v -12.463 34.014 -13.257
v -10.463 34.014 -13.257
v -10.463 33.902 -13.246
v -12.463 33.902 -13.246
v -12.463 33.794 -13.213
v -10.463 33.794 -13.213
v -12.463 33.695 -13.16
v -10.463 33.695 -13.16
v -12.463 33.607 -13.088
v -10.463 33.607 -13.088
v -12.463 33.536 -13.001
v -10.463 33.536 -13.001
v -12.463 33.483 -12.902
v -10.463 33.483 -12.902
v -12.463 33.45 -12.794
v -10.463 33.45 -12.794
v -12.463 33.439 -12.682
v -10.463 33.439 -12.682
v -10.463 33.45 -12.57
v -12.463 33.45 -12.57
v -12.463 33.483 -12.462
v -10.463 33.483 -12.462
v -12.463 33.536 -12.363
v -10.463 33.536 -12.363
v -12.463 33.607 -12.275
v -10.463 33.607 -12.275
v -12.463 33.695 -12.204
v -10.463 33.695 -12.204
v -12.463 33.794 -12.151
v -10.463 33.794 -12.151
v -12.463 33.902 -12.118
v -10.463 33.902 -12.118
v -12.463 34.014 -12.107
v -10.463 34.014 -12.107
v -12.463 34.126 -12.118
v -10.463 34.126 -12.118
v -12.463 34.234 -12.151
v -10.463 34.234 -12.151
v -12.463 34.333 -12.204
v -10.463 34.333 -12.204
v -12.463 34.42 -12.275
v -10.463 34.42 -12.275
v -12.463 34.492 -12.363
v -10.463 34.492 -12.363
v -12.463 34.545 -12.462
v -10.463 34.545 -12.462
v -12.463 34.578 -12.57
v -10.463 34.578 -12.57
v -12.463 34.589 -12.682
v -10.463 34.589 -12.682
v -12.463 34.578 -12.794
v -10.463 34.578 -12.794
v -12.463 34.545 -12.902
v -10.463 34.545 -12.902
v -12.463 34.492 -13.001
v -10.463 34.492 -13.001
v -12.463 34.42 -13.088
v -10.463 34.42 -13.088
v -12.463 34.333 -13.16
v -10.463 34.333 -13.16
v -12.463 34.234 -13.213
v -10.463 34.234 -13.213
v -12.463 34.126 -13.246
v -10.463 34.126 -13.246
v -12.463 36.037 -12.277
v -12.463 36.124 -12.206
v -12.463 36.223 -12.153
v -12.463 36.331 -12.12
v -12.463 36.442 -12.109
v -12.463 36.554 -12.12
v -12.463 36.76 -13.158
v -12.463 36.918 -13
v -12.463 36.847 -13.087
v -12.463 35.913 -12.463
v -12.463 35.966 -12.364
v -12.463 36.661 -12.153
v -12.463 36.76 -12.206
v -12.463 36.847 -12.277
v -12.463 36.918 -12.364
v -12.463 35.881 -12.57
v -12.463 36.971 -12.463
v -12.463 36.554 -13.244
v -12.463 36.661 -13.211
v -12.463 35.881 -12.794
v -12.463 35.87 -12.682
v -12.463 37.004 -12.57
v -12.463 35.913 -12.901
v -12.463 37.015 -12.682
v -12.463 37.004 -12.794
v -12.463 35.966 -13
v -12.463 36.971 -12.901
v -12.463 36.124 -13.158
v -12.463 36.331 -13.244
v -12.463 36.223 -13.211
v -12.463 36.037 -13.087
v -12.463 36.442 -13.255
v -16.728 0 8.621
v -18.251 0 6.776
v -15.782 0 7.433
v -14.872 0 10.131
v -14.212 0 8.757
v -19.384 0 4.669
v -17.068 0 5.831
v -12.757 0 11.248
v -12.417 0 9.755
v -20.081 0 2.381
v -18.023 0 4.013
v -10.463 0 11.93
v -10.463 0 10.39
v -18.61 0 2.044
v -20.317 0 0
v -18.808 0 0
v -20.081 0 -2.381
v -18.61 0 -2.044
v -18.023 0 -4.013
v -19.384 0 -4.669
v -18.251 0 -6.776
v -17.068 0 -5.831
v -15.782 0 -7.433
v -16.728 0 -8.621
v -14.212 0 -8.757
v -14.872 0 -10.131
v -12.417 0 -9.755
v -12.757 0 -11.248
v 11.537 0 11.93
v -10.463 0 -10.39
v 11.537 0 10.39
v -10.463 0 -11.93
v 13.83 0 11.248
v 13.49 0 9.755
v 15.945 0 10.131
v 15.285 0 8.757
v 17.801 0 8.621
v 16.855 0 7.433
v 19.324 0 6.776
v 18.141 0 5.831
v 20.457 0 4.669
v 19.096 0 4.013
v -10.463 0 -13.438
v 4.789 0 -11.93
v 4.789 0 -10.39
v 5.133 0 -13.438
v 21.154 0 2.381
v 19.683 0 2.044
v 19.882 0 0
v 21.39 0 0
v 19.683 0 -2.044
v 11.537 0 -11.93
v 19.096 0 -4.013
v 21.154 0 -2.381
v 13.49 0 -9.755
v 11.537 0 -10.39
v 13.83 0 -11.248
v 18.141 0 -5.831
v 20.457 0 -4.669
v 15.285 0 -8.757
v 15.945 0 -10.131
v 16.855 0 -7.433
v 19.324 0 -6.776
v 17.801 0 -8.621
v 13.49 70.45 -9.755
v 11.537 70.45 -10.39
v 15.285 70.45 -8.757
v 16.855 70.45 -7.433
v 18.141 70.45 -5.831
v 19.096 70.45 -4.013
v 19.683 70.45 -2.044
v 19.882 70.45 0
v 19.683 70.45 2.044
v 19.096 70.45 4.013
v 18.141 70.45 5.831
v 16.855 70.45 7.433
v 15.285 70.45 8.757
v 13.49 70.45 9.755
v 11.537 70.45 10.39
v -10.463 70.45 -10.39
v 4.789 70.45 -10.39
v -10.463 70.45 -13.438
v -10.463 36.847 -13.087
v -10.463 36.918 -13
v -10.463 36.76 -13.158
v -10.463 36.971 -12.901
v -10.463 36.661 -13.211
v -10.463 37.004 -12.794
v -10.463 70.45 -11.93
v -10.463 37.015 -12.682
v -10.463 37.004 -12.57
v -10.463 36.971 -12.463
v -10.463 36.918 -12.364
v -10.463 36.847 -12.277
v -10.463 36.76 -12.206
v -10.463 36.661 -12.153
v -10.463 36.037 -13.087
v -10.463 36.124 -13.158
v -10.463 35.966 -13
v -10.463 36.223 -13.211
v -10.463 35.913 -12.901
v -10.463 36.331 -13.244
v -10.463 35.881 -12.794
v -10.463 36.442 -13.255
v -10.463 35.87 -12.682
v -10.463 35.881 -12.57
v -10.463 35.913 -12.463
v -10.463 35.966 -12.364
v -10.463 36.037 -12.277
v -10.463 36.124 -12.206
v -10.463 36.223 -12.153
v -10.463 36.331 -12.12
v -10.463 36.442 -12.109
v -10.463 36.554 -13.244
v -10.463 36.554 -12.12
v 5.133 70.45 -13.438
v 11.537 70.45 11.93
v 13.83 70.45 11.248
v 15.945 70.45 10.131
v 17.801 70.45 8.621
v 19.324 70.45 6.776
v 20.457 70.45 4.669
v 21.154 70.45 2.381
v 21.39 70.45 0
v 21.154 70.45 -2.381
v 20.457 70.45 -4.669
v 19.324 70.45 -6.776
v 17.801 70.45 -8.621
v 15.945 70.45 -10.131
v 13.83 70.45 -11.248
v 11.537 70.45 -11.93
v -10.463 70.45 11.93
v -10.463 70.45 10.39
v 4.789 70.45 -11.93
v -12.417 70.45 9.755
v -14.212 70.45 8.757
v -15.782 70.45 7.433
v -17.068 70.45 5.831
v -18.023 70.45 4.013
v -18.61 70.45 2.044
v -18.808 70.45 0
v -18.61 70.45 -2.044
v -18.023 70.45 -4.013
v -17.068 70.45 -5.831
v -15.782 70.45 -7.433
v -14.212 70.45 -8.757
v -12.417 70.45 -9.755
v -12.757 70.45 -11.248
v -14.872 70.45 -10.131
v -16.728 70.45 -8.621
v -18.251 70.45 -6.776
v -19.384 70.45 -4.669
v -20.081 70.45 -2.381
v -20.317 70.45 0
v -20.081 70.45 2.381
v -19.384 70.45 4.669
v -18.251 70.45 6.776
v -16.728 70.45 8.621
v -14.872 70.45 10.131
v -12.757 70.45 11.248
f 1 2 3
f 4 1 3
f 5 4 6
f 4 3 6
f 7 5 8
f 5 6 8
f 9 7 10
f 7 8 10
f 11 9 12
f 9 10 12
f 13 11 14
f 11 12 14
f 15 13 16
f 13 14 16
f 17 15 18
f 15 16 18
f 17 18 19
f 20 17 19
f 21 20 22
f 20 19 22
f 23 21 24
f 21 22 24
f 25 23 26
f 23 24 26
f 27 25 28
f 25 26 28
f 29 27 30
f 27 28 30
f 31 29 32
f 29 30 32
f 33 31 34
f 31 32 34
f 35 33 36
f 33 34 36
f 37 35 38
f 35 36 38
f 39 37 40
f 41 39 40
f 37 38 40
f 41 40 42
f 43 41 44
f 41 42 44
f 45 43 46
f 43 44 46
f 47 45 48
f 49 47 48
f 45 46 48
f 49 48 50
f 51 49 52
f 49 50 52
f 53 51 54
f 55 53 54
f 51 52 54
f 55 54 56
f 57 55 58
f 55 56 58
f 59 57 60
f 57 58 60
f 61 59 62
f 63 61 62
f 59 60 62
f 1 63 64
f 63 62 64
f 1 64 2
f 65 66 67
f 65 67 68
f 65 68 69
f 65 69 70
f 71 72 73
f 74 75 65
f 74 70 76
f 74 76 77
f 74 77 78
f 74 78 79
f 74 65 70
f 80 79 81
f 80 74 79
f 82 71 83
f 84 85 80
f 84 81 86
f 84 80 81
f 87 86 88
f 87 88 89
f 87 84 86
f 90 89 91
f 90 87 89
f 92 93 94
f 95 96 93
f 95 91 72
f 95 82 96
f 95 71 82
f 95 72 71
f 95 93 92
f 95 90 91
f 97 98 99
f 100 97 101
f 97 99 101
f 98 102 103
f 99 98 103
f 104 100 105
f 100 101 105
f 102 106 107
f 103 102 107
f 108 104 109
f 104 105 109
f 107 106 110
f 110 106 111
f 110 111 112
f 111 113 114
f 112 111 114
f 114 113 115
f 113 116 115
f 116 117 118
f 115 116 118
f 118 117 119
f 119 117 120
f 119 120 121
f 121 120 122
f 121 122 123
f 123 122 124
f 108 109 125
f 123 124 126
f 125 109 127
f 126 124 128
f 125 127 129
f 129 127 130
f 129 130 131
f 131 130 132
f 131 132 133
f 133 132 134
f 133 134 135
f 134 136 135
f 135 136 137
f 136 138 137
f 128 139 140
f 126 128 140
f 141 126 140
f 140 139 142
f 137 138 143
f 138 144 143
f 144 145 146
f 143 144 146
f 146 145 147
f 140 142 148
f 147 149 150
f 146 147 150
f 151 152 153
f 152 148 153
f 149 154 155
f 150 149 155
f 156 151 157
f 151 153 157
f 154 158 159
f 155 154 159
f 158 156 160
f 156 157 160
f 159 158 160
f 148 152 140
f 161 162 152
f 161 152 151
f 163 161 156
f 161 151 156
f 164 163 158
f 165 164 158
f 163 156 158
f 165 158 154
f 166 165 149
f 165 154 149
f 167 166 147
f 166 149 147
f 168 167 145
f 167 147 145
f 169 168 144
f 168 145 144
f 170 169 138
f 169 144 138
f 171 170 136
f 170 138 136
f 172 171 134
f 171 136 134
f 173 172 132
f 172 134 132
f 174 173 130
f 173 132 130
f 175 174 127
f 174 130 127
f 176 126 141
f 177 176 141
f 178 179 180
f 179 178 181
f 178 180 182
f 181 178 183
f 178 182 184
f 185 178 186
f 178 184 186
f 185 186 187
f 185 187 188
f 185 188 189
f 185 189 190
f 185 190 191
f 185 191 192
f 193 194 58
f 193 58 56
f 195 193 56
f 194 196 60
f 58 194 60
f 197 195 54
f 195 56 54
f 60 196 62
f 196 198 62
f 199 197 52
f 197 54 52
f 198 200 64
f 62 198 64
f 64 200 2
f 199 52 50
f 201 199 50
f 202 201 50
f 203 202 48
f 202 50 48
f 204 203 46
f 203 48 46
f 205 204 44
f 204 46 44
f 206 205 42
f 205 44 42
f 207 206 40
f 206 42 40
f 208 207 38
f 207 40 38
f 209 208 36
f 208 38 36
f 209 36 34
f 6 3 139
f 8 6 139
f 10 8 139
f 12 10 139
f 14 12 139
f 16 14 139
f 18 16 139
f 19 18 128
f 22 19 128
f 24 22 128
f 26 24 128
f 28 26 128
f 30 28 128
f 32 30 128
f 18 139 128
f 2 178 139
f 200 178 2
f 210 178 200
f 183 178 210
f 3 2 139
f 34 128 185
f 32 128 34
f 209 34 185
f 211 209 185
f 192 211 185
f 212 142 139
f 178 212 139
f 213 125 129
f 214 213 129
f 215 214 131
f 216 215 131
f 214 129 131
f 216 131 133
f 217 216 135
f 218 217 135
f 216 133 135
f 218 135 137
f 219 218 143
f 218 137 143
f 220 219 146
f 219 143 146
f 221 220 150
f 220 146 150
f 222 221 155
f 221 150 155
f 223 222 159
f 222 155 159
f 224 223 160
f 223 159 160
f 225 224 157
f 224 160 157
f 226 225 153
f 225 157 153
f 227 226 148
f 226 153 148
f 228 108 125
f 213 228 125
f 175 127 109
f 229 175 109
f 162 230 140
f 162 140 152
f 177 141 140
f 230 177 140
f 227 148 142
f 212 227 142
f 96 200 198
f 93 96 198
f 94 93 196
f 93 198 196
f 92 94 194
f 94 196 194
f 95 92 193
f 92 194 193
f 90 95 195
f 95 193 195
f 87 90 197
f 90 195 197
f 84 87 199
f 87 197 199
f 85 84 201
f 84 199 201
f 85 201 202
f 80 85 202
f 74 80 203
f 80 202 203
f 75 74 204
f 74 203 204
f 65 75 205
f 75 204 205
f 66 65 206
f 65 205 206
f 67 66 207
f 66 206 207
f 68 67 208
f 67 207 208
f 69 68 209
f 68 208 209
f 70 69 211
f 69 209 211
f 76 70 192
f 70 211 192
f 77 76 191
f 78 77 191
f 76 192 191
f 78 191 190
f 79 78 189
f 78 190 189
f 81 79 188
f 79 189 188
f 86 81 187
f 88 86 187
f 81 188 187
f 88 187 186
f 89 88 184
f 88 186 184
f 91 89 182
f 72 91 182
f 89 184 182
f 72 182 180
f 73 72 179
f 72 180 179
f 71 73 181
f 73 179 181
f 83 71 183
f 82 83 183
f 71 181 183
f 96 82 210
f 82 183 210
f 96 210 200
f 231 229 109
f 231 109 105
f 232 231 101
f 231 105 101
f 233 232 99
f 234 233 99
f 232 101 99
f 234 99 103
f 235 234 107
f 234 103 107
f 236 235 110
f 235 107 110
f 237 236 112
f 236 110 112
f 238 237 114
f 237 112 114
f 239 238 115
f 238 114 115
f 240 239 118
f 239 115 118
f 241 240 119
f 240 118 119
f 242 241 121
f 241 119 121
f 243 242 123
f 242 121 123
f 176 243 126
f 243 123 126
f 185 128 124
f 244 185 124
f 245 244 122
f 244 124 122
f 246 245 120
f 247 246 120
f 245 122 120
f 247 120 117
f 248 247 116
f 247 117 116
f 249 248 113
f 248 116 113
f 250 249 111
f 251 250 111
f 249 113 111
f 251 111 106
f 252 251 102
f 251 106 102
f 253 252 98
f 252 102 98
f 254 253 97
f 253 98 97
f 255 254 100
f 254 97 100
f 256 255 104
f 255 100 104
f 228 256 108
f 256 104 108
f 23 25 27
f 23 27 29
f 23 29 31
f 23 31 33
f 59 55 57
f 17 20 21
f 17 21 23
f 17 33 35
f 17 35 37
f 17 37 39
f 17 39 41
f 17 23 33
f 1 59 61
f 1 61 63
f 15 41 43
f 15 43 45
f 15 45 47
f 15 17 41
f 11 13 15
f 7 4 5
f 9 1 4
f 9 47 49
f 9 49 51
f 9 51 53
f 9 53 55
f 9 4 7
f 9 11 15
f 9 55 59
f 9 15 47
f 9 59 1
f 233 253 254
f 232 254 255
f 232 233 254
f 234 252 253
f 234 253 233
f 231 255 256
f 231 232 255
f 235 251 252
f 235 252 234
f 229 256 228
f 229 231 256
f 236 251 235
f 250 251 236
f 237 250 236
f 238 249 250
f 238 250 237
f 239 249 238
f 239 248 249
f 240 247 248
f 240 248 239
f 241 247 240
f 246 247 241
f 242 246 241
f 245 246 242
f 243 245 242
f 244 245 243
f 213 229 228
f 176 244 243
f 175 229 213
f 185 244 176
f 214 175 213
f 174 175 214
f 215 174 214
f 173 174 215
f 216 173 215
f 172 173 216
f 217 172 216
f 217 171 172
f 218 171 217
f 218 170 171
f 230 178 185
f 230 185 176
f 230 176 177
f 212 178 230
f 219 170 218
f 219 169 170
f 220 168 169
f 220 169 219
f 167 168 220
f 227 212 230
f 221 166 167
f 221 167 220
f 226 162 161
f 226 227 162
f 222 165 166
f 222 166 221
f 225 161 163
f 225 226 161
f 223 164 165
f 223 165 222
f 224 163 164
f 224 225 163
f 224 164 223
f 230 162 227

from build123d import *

# Parameters (mm, degrees)
BOSS_EXTRUDE1_DEPTH = 70.45
SKETCH2_R           = 0.574746223
SKETCH2_R_2         = 0.572709313
BOSS_EXTRUDE2_DEPTH = 2


with BuildPart() as part:
    # Sketch1 → Boss-Extrude1 (new body)
    with BuildSketch(Plane(origin=(0, 0, 0), x_dir=(1, 0, 0), z_dir=(0, 1, 0))):
        with BuildLine():
            Line((-10.463385515, 13.437573917), (-10.463385515, 11.929541616))
            ThreePointArc((-10.463385515, 11.929541616), (-20.316677089, 0), (-10.463385515, -11.929541616))
            Line((-10.463385515, -11.929541616), (11.536614485, -11.929541616))
            ThreePointArc((11.536614485, -11.929541616), (21.38990606, 0), (11.536614485, 11.929541616))
            Line((11.536614485, 11.929541616), (5.132924913, 13.437573917))
            Line((5.132924913, 13.437573917), (-10.463385515, 13.437573917))
        make_face()
        with BuildLine():
            ThreePointArc((-10.463385515, -10.389541616), (-18.808385515, 0), (-10.463385515, 10.389541616))
            Line((-10.463385515, 10.389541616), (4.788760706, 10.389541616))
            Line((4.788760706, 10.389541616), (4.788760706, 11.929541616))
            Line((4.788760706, 11.929541616), (11.536614485, 10.389541616))
            ThreePointArc((11.536614485, 10.389541616), (19.881614485, 0), (11.536614485, -10.389541616))
            Line((11.536614485, -10.389541616), (-10.463385515, -10.389541616))
        make_face(mode=Mode.SUBTRACT)
    extrude(amount=BOSS_EXTRUDE1_DEPTH)

    # Sketch2 → Boss-Extrude2 (add)
    with BuildSketch(Plane.ZY.offset(10.463385515)):
        with Locations(Location((-12.681906896, 34.013885353, 0), (0, 0, 180))):
            Circle(SKETCH2_R)
        with Locations(Location((-12.681906896, 36.442241885, 0), (0, 0, 180))):
            Circle(SKETCH2_R_2)
    extrude(amount=BOSS_EXTRUDE2_DEPTH)


solid = part.part
